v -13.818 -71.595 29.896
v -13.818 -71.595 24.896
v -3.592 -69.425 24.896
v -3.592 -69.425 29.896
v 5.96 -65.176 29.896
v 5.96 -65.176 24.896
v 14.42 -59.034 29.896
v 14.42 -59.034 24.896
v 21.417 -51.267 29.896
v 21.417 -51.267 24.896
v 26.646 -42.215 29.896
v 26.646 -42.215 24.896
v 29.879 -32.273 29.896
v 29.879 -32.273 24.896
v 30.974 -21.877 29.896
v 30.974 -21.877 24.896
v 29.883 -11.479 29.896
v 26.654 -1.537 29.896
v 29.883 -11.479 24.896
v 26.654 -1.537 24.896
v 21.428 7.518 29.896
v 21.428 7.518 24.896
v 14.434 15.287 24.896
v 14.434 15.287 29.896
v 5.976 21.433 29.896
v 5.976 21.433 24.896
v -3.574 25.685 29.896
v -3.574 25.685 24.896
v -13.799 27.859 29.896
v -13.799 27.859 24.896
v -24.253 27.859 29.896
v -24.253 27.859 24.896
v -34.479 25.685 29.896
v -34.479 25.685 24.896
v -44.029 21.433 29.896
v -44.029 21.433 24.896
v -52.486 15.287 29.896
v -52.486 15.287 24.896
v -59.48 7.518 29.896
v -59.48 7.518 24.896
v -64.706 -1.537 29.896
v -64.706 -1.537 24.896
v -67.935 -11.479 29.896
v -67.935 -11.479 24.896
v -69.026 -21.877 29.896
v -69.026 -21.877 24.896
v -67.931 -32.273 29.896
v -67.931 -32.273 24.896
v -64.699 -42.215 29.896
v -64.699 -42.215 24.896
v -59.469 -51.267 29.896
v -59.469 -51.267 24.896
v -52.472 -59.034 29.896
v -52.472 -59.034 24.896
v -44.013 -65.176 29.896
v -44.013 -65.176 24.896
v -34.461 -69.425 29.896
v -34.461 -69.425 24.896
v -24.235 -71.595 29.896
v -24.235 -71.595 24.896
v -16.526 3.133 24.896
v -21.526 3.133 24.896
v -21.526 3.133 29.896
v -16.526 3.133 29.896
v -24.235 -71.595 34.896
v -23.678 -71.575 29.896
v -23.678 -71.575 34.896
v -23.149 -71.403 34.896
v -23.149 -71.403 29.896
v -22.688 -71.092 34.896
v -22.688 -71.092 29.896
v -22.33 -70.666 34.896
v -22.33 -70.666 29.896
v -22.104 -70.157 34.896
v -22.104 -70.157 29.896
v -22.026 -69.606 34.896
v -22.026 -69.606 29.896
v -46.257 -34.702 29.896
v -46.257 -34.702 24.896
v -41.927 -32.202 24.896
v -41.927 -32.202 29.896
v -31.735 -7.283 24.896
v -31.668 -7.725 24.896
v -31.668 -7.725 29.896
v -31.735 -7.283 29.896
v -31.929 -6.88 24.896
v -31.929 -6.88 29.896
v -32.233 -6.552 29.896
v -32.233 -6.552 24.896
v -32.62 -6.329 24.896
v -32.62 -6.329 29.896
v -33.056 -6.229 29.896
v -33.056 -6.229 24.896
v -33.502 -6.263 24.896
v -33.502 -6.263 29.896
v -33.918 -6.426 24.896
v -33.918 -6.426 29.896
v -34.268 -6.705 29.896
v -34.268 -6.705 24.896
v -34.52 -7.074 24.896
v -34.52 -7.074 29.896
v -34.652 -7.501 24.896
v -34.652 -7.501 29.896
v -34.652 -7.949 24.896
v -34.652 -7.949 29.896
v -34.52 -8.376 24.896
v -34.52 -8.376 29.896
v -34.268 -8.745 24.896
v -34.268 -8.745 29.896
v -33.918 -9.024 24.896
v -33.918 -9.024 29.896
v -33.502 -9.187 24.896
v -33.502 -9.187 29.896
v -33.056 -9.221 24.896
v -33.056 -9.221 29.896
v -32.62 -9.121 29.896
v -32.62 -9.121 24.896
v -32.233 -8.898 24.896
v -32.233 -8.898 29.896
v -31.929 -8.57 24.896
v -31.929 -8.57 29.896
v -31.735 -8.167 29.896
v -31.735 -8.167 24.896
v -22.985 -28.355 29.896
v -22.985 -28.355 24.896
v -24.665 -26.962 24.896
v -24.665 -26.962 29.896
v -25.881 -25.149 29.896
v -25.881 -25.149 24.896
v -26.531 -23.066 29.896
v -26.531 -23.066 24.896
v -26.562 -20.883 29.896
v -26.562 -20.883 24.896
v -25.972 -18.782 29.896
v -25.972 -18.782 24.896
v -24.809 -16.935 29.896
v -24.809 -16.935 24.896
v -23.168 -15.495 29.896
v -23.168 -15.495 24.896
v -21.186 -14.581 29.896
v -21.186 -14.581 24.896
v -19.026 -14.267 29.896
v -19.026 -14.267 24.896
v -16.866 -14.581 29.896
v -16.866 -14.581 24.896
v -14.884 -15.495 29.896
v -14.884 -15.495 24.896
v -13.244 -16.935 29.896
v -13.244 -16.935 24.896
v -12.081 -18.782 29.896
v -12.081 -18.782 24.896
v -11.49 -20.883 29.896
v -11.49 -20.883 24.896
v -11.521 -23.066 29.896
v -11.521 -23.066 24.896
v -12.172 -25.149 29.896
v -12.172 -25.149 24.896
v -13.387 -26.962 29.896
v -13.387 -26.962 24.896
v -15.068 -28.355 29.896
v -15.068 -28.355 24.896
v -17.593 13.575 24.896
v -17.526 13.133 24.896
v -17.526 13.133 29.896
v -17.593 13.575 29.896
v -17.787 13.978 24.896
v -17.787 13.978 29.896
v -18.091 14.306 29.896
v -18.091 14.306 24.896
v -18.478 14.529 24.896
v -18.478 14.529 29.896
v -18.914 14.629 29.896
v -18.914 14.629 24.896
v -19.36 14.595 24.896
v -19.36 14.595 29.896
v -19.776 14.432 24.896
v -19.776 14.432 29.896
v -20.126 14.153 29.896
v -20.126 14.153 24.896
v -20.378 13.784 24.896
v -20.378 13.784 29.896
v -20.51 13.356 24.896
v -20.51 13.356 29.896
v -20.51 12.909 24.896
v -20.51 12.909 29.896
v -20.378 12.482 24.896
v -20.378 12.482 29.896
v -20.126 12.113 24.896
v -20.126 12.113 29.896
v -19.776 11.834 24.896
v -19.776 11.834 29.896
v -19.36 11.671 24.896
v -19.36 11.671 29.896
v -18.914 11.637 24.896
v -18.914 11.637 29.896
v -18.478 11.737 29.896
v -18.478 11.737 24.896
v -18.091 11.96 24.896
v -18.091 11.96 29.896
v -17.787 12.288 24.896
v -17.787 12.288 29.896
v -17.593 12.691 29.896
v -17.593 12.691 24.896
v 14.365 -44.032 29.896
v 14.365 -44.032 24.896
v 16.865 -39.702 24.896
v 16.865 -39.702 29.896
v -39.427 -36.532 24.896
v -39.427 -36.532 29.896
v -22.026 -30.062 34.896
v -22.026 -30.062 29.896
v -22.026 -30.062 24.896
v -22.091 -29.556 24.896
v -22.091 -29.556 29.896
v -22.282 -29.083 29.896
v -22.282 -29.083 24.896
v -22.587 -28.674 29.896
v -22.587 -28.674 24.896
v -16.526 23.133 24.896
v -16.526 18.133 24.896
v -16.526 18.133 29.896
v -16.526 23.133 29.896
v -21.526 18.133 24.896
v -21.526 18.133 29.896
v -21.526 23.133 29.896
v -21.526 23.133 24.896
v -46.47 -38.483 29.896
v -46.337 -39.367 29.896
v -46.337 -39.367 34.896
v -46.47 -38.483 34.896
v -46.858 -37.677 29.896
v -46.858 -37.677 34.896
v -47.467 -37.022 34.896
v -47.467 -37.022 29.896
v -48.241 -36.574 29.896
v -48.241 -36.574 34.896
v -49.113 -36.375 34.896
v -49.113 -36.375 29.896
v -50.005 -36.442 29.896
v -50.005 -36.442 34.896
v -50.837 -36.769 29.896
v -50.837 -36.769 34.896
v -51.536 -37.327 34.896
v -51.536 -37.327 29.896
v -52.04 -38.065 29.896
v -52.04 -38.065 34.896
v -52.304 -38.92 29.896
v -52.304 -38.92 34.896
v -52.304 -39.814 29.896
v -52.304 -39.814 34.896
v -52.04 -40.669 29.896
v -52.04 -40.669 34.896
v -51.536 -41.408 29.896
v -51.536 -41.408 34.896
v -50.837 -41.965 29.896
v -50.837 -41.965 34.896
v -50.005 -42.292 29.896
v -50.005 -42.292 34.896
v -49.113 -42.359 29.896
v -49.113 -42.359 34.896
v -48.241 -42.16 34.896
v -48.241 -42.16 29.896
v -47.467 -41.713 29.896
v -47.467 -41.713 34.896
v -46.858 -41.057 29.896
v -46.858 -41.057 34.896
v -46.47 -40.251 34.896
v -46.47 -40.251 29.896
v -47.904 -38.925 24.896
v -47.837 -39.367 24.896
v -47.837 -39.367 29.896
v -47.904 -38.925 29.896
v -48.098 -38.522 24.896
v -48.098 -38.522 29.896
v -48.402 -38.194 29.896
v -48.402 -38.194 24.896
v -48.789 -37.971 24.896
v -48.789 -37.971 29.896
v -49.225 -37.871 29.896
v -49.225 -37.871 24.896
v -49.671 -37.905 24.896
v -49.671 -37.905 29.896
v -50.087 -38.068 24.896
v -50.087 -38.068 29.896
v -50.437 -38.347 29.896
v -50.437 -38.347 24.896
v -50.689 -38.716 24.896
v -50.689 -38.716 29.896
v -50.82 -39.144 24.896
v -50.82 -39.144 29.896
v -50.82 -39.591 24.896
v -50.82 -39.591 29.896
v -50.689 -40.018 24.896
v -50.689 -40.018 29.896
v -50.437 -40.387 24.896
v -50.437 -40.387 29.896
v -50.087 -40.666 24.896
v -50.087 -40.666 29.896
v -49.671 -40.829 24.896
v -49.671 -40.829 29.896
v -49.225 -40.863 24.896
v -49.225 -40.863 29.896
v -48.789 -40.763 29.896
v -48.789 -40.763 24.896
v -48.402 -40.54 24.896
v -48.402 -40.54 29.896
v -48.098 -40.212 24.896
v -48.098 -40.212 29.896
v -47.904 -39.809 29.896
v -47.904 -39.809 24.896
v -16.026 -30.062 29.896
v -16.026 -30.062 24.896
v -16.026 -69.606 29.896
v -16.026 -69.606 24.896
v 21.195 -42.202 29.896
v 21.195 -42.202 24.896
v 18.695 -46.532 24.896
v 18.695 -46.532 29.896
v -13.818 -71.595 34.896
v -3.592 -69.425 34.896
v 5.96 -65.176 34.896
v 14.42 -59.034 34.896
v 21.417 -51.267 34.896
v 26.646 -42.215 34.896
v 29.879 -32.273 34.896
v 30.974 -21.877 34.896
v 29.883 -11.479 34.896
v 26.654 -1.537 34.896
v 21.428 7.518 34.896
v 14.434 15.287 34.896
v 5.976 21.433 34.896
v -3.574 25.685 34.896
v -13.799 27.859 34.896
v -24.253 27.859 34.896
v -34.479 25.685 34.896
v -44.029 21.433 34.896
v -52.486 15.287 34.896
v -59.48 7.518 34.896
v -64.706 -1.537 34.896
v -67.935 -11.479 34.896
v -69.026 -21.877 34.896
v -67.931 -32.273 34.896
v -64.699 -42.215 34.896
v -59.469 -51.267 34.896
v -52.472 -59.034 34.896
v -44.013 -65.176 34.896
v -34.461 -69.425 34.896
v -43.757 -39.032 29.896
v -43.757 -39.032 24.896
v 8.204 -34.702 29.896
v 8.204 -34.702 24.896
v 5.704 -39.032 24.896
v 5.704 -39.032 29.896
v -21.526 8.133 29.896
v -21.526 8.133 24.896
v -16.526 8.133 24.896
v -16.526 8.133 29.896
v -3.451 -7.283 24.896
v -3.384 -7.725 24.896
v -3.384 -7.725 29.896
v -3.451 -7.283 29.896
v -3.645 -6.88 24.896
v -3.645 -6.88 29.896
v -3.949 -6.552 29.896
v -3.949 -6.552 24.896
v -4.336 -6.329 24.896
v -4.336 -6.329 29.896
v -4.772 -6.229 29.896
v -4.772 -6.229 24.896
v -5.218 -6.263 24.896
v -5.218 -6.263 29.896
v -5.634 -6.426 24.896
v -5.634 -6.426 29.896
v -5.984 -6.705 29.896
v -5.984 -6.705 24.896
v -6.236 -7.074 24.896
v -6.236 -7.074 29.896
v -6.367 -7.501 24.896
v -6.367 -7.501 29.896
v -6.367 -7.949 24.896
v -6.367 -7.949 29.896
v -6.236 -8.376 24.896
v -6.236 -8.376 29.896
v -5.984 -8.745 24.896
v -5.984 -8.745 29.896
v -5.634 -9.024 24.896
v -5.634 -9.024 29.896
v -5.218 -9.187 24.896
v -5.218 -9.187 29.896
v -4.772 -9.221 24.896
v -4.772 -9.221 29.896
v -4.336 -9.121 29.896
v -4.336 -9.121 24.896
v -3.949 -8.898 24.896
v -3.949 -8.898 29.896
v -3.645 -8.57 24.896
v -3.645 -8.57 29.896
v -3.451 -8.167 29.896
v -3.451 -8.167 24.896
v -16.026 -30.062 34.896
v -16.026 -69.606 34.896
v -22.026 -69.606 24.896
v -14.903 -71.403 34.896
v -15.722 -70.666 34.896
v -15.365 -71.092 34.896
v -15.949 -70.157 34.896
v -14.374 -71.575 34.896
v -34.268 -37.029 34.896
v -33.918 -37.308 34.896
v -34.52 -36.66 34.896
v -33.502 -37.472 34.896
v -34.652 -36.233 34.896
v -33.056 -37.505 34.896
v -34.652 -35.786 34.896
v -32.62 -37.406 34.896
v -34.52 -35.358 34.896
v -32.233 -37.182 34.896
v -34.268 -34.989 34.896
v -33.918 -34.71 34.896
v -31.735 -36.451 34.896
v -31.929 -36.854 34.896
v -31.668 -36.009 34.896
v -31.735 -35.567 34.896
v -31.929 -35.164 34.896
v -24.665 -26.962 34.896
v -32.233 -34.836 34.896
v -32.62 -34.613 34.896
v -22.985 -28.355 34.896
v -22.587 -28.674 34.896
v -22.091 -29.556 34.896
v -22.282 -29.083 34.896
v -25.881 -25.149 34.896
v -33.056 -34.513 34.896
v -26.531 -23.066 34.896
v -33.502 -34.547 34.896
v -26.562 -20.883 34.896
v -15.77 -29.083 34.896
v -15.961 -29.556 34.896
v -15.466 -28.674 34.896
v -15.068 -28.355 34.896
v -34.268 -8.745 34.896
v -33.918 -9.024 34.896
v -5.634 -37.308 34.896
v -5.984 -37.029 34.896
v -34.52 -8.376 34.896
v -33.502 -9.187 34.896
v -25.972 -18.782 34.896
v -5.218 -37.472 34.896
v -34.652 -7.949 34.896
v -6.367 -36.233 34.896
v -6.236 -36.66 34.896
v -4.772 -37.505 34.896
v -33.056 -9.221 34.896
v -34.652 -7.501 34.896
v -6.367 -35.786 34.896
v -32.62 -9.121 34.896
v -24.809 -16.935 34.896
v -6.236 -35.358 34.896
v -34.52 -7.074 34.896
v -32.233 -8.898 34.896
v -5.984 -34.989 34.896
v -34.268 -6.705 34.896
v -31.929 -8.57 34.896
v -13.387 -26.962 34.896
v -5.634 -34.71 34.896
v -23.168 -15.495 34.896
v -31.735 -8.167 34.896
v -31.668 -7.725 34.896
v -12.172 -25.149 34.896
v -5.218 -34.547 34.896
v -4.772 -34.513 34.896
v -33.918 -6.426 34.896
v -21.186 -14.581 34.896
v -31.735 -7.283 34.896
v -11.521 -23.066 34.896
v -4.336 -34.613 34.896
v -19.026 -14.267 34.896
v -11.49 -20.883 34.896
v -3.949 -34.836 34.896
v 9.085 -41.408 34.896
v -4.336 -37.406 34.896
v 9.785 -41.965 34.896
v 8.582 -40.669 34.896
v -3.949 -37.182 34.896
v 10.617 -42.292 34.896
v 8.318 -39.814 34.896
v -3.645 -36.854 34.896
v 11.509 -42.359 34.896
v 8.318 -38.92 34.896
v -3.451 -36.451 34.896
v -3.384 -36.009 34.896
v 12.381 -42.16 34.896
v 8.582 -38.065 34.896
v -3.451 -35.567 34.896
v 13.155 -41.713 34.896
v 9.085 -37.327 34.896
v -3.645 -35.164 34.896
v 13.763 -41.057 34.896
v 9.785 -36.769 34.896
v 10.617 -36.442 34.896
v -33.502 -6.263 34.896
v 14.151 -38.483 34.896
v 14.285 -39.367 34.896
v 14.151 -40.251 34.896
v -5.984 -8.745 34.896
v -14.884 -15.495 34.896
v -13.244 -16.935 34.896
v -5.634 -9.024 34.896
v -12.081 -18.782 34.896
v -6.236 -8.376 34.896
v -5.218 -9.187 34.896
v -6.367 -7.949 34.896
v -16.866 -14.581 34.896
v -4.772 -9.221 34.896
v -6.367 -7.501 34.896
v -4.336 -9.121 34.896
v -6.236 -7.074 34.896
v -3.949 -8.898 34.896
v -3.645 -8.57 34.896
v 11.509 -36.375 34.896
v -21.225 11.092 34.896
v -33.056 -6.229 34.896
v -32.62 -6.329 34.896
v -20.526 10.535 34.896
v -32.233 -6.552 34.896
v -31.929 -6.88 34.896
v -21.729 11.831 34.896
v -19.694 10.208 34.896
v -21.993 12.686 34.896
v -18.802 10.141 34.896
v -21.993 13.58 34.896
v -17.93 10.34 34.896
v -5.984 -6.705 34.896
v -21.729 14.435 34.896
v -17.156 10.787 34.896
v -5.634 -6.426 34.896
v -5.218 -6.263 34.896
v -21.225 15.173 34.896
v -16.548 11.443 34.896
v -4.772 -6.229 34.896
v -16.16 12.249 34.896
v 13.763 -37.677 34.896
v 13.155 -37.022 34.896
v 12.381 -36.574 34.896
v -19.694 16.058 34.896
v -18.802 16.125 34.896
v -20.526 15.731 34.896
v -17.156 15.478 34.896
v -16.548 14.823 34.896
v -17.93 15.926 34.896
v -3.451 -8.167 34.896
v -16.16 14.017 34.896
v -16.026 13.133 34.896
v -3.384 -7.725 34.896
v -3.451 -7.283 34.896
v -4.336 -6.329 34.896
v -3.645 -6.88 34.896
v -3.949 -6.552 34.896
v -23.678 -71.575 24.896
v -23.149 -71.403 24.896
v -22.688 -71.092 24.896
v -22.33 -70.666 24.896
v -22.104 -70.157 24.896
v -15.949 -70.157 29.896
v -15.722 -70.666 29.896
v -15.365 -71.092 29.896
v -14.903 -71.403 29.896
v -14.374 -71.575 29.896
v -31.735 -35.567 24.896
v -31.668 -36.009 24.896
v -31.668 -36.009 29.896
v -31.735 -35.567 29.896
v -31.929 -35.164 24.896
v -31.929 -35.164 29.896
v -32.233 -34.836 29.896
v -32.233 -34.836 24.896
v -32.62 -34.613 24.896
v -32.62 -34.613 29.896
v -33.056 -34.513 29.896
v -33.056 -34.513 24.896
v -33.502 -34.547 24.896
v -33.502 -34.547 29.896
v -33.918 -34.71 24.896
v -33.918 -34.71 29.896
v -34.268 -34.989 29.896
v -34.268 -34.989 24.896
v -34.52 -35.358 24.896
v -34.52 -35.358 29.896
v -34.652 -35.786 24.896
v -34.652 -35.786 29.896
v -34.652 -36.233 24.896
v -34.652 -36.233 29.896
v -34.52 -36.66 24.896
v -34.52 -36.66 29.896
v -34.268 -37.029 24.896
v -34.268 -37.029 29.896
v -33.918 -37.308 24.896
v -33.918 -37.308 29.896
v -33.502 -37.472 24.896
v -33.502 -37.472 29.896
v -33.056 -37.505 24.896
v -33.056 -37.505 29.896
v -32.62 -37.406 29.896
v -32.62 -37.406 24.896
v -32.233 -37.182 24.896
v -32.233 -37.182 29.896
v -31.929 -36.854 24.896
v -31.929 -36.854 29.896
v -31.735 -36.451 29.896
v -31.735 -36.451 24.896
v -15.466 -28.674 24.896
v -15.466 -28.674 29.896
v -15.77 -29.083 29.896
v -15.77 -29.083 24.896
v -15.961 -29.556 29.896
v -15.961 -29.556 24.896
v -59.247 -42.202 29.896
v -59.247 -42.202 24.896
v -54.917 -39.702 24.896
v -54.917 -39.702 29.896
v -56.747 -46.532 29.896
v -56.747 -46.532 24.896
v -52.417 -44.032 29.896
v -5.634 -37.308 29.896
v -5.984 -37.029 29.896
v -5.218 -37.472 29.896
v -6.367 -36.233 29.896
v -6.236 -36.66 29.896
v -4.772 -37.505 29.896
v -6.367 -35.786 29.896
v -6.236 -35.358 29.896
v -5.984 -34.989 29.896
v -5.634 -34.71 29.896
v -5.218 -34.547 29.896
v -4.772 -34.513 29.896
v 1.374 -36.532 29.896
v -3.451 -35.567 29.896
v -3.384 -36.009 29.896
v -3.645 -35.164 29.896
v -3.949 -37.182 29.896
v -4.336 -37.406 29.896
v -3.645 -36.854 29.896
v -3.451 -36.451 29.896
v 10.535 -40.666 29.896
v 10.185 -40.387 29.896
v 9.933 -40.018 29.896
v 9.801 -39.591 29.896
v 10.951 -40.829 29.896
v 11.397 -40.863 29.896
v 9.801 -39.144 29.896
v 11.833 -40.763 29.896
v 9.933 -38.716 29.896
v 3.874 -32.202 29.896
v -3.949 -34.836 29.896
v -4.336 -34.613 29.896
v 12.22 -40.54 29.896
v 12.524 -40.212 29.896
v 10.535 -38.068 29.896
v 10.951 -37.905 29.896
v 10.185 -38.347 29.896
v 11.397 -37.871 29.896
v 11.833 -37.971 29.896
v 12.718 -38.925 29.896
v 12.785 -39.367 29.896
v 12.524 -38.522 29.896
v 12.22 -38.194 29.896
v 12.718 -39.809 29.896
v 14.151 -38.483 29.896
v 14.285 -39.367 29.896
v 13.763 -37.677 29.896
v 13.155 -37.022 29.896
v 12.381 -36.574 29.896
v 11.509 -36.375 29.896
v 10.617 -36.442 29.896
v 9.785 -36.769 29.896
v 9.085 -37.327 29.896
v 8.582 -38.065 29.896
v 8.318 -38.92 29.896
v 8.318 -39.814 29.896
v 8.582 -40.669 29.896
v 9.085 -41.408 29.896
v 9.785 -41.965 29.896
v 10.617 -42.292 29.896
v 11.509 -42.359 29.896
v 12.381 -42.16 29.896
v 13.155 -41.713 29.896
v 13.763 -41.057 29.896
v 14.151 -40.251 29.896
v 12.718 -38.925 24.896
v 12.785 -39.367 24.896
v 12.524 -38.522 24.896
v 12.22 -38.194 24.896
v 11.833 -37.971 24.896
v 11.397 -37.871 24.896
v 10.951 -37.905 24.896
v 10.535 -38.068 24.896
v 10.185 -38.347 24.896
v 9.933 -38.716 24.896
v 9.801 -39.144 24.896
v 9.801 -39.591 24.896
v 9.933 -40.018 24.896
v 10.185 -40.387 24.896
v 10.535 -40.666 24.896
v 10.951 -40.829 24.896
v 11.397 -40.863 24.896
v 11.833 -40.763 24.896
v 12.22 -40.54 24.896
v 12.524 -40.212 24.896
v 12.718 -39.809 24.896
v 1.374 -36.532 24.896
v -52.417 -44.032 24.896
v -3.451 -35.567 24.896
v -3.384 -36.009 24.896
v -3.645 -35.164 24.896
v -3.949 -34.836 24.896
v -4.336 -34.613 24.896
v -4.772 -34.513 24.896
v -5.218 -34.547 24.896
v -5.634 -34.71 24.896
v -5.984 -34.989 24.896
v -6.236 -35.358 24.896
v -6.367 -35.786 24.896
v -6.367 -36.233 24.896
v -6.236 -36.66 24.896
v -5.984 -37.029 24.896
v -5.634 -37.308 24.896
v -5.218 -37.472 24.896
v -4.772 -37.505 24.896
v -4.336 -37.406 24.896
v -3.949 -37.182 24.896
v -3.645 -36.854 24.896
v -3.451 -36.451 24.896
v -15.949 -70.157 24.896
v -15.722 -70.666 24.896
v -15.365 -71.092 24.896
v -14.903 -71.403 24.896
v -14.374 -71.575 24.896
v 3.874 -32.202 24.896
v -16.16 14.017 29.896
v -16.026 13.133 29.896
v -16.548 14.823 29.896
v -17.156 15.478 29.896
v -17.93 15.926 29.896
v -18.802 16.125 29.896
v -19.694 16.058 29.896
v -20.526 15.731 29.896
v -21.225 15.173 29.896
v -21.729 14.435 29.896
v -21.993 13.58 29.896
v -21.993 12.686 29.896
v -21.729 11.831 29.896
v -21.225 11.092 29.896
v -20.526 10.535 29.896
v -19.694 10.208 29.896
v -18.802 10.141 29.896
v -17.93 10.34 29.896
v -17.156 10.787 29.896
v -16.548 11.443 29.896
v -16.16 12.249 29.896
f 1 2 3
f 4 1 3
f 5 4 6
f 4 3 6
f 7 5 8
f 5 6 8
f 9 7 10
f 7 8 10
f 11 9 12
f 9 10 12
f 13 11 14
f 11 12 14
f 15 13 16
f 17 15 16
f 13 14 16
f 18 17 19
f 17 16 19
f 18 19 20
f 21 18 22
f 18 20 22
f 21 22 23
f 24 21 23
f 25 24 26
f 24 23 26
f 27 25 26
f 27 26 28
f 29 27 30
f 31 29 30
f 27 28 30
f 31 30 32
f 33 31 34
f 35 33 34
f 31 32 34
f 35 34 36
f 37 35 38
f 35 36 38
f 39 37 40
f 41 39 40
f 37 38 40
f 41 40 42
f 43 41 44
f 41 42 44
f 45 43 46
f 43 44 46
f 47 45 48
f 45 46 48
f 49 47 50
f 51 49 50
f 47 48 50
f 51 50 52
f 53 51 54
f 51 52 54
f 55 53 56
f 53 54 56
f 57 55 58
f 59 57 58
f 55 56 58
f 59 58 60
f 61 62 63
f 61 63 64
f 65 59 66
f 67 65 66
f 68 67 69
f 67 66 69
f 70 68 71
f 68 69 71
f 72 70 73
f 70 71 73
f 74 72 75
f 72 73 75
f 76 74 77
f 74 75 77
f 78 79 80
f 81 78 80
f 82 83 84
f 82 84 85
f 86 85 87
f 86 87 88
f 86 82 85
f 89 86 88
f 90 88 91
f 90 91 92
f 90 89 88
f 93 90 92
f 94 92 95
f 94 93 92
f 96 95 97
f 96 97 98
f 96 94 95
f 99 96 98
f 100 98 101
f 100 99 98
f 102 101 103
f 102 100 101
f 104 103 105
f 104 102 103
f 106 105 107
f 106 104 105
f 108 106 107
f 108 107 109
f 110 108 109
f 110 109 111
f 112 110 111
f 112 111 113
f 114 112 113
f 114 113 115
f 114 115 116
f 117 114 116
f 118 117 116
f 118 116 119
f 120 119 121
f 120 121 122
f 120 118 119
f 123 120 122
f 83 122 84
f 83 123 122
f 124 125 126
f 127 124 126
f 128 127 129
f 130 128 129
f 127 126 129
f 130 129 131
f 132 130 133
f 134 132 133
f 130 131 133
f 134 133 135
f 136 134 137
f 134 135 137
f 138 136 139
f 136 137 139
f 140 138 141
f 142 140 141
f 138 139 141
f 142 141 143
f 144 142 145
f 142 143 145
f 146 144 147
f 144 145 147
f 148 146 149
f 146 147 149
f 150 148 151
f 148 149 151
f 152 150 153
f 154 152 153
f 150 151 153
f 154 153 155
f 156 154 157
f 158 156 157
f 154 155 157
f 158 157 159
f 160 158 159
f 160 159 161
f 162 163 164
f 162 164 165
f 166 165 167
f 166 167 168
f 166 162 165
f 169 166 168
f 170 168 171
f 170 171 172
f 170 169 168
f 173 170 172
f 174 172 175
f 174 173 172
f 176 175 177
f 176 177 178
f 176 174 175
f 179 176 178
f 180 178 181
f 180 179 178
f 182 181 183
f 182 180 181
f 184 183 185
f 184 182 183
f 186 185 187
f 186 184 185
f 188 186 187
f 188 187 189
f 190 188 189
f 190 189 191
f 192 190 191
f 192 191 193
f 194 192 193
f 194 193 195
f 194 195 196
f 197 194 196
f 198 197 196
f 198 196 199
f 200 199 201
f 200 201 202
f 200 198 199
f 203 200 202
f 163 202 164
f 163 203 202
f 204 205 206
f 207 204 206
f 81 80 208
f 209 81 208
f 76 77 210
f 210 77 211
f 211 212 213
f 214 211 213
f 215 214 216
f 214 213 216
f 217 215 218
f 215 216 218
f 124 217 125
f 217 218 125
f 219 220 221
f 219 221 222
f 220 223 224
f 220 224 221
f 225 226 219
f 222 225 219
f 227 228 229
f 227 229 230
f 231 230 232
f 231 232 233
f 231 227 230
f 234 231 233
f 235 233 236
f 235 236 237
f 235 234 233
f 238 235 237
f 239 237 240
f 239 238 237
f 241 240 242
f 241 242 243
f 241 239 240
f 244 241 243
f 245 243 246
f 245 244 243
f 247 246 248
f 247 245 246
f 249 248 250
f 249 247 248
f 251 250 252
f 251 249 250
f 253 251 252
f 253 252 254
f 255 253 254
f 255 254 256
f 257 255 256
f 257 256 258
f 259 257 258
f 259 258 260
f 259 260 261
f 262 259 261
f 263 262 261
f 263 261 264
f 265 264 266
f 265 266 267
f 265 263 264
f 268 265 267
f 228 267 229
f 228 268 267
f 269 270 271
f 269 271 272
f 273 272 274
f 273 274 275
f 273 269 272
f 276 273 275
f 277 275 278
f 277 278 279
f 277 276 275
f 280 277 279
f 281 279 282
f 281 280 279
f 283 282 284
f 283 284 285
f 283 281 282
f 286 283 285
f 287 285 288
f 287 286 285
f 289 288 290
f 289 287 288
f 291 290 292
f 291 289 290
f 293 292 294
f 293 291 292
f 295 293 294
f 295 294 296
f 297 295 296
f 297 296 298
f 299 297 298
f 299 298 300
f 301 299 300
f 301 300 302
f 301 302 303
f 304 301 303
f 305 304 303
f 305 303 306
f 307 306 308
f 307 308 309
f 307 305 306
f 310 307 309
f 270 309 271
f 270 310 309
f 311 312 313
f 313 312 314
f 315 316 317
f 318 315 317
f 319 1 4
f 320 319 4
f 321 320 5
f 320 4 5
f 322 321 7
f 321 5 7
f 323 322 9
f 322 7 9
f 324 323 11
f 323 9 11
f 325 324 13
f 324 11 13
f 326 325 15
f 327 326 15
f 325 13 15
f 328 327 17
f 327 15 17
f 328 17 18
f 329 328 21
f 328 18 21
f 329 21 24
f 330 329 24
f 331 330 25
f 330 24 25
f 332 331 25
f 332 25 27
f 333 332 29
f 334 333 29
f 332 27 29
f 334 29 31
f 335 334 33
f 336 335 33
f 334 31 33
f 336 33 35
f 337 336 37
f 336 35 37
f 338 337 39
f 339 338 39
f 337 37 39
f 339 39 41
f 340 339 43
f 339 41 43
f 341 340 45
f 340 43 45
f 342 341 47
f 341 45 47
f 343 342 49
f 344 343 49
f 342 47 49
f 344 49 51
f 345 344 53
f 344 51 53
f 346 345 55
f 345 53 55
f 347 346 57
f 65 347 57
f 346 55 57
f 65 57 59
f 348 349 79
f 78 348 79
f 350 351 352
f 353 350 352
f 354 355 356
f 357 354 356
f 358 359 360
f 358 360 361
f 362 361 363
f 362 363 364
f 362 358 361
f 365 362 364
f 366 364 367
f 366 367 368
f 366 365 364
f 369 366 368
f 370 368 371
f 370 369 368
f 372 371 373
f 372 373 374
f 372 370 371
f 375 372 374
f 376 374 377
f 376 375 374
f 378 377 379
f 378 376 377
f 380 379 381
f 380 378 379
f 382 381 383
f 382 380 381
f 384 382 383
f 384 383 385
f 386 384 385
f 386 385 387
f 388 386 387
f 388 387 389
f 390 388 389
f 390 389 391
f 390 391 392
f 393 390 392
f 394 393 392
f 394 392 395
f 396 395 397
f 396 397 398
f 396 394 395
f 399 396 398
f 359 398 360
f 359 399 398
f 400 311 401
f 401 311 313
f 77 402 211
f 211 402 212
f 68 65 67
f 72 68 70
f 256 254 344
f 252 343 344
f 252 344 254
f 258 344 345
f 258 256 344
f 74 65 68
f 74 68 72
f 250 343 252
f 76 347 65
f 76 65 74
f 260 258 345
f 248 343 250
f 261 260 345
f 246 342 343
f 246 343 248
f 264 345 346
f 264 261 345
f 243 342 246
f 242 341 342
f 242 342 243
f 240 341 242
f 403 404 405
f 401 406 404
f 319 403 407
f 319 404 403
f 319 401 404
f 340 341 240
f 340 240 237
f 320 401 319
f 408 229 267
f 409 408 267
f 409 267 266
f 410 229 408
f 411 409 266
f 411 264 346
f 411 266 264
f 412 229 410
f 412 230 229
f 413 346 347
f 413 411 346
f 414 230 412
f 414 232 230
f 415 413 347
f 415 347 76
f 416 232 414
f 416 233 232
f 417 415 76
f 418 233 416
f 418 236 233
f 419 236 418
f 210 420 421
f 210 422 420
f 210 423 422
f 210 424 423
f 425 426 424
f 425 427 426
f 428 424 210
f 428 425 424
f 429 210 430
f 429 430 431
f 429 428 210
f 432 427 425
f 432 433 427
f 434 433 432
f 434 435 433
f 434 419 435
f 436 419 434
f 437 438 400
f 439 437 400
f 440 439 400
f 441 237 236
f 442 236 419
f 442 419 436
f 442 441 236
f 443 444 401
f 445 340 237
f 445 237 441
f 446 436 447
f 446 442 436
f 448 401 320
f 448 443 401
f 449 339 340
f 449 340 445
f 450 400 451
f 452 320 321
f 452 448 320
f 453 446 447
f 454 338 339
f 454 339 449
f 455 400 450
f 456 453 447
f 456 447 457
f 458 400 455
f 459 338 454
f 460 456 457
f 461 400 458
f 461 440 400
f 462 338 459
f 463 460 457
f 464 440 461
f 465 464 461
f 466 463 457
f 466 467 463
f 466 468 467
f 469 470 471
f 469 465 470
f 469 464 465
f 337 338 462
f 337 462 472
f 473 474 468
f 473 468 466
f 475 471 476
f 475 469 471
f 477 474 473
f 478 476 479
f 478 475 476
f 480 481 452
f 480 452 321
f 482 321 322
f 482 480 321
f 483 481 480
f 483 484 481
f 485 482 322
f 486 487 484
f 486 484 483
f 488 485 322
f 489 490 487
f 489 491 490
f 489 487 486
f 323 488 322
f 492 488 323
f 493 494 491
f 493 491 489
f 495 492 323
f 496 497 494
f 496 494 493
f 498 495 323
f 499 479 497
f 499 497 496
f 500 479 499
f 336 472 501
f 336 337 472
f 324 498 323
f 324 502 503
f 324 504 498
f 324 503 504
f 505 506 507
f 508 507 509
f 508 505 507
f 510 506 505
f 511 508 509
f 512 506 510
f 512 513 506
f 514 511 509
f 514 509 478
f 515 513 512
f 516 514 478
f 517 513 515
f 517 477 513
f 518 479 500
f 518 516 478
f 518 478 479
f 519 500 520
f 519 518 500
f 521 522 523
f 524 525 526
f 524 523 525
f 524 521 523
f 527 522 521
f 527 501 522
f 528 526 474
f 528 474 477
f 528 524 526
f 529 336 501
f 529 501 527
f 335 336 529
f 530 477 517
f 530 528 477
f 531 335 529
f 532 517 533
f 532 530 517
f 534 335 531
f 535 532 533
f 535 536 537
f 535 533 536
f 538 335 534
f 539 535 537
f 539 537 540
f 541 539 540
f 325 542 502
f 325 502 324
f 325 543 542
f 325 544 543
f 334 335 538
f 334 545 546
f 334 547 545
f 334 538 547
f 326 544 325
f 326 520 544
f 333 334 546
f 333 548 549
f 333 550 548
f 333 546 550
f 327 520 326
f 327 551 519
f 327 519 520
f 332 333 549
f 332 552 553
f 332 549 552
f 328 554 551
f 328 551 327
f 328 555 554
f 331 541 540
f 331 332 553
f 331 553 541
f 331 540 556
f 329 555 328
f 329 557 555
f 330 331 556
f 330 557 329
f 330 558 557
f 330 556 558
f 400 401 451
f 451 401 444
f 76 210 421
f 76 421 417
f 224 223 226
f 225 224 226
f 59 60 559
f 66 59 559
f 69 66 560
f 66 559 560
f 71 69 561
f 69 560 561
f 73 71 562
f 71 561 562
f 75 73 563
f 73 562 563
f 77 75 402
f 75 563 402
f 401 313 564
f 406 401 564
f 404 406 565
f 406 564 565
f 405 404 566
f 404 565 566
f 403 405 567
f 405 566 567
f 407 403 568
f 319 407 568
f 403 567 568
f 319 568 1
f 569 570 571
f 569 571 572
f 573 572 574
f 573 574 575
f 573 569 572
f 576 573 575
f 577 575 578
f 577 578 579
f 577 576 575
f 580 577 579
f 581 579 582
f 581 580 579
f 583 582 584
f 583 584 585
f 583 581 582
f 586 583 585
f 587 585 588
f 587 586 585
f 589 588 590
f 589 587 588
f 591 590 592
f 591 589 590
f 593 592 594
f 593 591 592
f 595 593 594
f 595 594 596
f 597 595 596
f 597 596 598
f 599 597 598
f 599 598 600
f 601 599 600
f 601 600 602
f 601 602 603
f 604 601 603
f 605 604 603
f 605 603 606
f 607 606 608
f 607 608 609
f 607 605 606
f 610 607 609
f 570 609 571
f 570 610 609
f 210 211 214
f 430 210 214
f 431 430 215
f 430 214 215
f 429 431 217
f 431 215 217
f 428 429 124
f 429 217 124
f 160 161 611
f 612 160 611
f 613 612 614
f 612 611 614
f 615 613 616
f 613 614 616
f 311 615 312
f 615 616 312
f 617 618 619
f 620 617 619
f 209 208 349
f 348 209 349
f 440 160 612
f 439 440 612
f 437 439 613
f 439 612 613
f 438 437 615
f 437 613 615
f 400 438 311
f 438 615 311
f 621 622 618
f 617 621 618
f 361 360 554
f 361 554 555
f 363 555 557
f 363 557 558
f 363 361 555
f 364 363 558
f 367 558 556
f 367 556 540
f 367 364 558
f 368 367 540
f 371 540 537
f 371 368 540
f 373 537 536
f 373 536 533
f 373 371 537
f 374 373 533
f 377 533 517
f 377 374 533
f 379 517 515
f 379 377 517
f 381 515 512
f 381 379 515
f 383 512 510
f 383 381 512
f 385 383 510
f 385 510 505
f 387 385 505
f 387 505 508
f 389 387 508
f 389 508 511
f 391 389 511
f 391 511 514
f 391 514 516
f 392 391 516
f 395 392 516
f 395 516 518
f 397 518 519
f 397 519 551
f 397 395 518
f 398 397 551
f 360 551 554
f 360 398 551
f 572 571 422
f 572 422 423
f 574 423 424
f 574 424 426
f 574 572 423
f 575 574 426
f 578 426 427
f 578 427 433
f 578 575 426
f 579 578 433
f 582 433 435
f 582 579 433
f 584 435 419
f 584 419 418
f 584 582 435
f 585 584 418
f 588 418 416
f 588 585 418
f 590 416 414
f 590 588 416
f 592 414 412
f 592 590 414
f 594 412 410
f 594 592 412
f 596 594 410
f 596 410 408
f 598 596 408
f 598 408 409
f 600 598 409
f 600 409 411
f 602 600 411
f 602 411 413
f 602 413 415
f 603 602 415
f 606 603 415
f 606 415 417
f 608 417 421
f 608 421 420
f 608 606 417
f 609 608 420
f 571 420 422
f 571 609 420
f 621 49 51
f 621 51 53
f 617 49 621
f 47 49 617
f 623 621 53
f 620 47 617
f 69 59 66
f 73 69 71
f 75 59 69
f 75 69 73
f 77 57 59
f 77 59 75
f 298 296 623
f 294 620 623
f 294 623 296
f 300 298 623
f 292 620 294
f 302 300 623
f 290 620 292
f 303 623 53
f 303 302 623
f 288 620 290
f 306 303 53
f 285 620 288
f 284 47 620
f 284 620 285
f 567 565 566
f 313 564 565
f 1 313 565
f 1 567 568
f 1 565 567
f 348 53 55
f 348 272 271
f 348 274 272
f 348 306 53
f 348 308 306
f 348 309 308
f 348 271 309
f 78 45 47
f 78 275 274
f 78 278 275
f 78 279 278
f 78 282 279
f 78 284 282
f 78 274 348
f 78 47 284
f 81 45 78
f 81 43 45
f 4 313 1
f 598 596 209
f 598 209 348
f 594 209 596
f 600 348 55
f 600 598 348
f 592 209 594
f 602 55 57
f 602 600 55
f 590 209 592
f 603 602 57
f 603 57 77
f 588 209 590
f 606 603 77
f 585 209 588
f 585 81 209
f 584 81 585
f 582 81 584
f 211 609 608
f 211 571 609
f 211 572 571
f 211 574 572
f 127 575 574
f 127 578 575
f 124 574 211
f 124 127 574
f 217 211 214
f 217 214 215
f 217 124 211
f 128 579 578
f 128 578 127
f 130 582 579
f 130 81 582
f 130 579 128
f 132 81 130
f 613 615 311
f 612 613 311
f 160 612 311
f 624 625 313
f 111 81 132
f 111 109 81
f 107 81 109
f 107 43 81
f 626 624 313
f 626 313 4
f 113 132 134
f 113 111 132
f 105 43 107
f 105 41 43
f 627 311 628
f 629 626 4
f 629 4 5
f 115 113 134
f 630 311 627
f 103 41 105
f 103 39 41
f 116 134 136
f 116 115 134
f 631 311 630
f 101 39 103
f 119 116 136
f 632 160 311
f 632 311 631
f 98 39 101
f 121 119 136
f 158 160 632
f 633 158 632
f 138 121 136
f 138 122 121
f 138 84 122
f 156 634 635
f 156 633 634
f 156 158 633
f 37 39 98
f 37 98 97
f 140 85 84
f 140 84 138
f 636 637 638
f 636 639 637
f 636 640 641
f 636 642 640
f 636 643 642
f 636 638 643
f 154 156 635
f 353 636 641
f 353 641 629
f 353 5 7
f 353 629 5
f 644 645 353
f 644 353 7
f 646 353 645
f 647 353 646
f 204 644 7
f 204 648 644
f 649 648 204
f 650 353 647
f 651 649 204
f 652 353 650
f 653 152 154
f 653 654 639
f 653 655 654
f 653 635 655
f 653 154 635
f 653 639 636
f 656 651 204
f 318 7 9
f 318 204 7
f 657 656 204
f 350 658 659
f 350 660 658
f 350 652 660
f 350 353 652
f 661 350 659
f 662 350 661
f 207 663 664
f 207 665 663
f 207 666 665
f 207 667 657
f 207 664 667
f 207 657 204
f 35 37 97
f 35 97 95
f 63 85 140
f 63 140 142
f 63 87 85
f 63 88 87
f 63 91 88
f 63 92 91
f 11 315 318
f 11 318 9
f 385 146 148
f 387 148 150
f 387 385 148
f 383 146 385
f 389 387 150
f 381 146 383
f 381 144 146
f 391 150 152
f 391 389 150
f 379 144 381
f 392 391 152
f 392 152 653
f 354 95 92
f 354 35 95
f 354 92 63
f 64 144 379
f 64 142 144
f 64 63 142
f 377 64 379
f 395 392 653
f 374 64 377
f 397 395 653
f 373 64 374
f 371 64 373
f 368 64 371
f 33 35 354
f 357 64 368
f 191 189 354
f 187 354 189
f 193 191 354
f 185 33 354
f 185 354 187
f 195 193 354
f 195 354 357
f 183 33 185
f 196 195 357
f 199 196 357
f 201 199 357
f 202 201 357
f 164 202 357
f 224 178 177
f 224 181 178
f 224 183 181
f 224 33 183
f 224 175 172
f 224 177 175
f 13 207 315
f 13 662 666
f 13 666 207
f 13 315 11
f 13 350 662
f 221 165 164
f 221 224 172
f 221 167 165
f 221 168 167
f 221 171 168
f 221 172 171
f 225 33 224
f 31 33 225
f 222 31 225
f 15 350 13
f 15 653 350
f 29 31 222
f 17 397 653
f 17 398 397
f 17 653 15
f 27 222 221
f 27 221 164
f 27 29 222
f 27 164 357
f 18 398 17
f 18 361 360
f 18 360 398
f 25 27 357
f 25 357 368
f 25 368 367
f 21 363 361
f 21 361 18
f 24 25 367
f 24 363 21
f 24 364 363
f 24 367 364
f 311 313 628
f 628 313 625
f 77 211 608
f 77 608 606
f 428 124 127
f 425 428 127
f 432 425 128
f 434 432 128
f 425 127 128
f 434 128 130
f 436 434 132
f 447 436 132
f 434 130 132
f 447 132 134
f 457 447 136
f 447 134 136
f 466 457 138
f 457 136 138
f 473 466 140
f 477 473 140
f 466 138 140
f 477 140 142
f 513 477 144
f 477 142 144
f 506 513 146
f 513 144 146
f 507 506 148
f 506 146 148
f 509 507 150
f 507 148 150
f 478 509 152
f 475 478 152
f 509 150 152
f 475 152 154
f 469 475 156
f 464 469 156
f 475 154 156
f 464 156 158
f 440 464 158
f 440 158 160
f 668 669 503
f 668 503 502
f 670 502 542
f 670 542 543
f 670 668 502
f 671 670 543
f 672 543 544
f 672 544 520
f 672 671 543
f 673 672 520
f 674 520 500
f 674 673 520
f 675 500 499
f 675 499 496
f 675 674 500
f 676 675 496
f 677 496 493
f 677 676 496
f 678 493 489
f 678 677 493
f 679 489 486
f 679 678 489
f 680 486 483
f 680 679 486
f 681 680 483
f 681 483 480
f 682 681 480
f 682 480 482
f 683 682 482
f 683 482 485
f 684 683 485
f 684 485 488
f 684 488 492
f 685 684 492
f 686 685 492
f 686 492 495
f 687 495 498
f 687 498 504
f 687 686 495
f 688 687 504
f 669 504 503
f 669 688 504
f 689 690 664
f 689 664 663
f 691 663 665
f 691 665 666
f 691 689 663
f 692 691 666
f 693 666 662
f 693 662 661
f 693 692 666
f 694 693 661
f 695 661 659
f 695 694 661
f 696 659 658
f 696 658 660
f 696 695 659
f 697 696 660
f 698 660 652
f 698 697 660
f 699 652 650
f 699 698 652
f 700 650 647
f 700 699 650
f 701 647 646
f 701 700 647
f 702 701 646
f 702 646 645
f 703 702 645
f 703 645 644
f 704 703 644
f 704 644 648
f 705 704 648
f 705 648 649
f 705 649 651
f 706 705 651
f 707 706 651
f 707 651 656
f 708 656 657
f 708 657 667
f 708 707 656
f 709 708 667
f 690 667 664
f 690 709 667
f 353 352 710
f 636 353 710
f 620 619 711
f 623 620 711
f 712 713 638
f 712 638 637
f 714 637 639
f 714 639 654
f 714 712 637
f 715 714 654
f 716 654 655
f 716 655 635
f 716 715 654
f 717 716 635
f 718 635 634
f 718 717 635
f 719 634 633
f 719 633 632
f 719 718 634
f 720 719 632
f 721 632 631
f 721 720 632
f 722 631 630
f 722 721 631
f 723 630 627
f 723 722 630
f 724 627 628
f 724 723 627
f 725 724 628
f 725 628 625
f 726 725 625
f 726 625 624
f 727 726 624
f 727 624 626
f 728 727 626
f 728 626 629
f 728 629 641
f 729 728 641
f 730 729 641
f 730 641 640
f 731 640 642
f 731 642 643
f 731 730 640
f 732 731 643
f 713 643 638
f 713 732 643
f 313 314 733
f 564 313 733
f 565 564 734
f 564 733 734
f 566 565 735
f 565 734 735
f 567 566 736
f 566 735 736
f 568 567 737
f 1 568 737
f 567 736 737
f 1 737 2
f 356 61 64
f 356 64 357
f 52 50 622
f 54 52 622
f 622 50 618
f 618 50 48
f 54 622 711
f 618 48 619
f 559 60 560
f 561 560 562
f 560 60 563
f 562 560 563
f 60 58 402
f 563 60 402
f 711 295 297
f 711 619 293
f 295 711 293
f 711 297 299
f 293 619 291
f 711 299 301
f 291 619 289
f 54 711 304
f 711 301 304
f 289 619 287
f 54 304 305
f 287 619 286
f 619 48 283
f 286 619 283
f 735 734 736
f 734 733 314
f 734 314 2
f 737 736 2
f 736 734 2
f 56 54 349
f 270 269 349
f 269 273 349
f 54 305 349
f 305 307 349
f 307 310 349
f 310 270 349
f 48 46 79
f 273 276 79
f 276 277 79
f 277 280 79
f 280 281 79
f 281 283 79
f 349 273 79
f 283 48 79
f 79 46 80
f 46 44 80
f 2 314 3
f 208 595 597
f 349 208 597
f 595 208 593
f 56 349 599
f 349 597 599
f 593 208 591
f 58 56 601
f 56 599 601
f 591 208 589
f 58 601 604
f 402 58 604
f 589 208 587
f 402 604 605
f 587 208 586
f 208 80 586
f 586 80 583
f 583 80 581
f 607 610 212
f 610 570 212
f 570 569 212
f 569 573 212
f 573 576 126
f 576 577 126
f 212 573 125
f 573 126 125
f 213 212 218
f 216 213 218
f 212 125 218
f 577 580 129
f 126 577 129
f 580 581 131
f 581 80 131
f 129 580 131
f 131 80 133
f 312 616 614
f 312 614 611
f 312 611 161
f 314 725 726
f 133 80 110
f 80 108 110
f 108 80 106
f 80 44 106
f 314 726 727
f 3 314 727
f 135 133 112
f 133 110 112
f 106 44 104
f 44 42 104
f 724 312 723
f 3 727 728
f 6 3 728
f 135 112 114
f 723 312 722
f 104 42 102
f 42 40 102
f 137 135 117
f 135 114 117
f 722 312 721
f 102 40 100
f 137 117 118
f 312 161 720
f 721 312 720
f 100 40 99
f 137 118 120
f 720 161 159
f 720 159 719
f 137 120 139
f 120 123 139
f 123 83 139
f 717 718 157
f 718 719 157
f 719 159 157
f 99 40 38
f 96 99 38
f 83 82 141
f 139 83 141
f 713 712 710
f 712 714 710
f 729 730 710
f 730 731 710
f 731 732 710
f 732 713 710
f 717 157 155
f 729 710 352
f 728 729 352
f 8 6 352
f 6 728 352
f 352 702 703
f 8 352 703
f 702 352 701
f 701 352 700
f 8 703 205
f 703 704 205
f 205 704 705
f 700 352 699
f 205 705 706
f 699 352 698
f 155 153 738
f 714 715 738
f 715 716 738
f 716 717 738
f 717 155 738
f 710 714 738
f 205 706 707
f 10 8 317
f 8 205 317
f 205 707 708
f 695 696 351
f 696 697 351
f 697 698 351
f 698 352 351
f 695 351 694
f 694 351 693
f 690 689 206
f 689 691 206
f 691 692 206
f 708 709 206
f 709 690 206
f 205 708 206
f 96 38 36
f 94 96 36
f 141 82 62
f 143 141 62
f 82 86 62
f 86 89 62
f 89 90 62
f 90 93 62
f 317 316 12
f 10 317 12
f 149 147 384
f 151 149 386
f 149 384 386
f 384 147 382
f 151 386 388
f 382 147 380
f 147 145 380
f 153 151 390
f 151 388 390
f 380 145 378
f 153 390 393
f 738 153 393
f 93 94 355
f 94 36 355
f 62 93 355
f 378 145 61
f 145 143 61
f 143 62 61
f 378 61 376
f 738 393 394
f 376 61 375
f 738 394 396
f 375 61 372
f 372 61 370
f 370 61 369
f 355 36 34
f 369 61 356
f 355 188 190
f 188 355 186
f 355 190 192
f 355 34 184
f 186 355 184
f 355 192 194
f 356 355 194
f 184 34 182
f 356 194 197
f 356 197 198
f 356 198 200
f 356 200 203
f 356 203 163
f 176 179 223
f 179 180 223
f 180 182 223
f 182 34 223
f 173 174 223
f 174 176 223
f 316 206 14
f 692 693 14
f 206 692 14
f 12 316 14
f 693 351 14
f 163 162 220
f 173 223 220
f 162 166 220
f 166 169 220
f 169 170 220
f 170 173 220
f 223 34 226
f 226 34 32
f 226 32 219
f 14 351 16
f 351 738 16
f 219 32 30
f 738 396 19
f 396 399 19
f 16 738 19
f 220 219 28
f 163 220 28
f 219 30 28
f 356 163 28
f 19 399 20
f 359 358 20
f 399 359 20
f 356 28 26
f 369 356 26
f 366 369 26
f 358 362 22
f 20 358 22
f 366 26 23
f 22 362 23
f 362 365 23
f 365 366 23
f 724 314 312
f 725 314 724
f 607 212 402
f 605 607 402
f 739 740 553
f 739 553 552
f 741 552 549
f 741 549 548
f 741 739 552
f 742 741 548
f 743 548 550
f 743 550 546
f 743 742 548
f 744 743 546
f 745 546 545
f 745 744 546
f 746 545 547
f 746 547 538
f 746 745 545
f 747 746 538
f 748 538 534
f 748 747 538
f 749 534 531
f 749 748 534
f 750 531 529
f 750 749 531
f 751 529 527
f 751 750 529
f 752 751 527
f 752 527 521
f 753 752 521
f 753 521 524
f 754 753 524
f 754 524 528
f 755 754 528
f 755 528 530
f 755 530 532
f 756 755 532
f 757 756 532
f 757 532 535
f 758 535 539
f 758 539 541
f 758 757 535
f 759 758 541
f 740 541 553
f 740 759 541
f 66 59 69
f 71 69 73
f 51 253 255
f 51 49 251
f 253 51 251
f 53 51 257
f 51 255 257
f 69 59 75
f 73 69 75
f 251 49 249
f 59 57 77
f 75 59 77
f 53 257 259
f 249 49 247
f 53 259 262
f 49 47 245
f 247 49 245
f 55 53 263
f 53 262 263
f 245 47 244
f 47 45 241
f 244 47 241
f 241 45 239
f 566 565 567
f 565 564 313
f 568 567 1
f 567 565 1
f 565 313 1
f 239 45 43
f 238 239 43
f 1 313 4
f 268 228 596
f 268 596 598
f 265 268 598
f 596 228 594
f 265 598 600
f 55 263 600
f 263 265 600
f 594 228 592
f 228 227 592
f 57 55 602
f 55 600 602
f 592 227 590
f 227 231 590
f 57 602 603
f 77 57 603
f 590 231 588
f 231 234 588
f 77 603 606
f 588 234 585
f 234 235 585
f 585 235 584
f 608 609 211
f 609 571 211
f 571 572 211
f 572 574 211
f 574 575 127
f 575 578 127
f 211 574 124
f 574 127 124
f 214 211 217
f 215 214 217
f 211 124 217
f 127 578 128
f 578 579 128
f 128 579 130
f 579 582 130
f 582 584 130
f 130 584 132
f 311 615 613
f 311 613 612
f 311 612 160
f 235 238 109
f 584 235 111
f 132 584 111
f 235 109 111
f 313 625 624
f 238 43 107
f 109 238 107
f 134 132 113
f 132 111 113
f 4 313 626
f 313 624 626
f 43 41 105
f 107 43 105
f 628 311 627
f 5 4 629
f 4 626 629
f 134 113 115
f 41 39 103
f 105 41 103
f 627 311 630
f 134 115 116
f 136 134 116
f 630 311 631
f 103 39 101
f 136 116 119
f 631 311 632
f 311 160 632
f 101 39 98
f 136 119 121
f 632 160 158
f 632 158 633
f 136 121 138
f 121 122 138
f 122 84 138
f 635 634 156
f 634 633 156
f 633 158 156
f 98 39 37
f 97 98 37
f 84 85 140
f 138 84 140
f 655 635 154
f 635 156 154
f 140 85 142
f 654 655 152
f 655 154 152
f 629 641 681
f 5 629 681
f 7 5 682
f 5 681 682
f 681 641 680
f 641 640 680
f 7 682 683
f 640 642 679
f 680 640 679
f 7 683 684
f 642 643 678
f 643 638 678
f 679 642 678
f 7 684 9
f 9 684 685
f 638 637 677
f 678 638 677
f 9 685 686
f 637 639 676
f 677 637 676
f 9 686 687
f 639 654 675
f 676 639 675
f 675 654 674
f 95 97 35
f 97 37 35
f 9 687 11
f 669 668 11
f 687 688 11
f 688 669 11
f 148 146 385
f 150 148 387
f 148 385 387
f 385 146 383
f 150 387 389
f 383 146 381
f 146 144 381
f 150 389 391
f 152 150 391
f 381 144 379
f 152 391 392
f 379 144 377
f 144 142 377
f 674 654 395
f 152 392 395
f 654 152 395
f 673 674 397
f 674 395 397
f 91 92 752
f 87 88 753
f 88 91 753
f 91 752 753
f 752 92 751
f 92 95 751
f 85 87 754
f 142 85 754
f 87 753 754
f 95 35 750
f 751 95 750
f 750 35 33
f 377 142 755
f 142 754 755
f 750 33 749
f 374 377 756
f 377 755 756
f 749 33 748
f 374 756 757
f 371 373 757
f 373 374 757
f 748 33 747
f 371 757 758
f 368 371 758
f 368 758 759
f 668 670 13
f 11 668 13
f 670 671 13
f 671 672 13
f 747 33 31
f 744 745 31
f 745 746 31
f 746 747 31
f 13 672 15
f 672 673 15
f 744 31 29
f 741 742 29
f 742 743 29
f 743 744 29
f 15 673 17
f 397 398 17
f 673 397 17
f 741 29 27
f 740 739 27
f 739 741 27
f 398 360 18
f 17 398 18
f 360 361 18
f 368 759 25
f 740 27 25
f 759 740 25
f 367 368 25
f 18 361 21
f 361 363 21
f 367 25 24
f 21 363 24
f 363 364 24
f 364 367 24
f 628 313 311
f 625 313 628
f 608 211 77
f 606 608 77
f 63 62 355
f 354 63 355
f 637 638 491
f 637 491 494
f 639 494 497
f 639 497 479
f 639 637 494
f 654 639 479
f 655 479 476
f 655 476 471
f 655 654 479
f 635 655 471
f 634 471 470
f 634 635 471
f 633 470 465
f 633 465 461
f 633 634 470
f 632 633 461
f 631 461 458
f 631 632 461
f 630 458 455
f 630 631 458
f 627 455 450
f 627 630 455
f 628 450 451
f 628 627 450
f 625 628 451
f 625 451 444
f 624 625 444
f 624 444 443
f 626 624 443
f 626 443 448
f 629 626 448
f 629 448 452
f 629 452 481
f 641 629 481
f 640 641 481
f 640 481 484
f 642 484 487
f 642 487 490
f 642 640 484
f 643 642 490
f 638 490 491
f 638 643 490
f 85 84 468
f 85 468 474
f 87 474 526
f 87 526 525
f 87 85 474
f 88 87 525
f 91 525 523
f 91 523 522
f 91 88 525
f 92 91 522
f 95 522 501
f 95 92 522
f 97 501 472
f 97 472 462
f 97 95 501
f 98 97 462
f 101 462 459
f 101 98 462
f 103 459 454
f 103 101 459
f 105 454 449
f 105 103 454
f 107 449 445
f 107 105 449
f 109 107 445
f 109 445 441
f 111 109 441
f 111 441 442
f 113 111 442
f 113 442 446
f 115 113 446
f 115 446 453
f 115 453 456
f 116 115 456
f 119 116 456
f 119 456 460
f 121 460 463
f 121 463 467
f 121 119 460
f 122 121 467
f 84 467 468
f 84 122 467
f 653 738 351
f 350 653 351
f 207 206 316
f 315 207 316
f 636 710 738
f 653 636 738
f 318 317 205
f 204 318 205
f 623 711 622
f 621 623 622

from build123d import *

# Parameters (mm, degrees)
BODY_MOVE_COPY2_START     = 24.896087842
BODY_MOVE_COPY2_OUTLINE_R = 1.5
BODY_MOVE_COPY2_OUTLINE_W = 5
BODY_MOVE_COPY2_OUTLINE_H = 5
BODY_MOVE_COPY2_DEPTH     = 5
SKETCH2_R                 = 3
SKETCH2_R_2               = 1.5
BOSS_EXTRUDE1_DEPTH       = 5


# Read off the part's stored shape, not the designer's step: Body-Move/Copy2
with BuildPart() as part:
    # Body-Move/Copy2 outline → Body-Move/Copy2 (new body)
    with BuildSketch(Plane.XY.offset(BODY_MOVE_COPY2_START)):
        with BuildLine():
            ThreePointArc((-22.026273853, -30.062216719), (-22.282236391, -29.083271708), (-22.984607186, -28.354899948))
            ThreePointArc((-22.984607186, -28.354899948), (-19.026273852, -14.267096219), (-15.067940519, -28.354899948))
            ThreePointArc((-15.067940519, -28.354899948), (-15.770311314, -29.083271708), (-16.026273853, -30.062216719))
            Line((-16.026273853, -30.062216719), (-16.026273853, -69.605969269))
            ThreePointArc((-16.026273853, -69.605969269), (-15.364805386, -71.092015477), (-13.817940519, -71.595088979))
            ThreePointArc((-13.817940519, -71.595088979), (-19.026273853, 28.132903781), (-24.234607186, -71.595088979))
            ThreePointArc((-24.234607186, -71.595088979), (-22.687742319, -71.092015477), (-22.026273853, -69.605969269))
            Line((-22.026273853, -69.605969269), (-22.026273853, -30.062216719))
        make_face()
        Polygon((-59.247417023, -42.20203271), (-54.917290004, -39.70203271), (-52.417290004, -44.032159729), (-56.747417023, -46.532159729), align=None, mode=Mode.SUBTRACT)
        with Locations((-49.337162985, -39.367096219)):
            Circle(BODY_MOVE_COPY2_OUTLINE_R, mode=Mode.SUBTRACT)
        Polygon((-39.426908947, -36.532159729), (-43.757035966, -39.032159729), (-46.257035966, -34.70203271), (-41.926908947, -32.20203271), align=None, mode=Mode.SUBTRACT)
        with Locations((-33.168409476, -36.009231843)):
            Circle(BODY_MOVE_COPY2_OUTLINE_R, mode=Mode.SUBTRACT)
        with Locations((-4.884138229, -36.009231843)):
            Circle(BODY_MOVE_COPY2_OUTLINE_R, mode=Mode.SUBTRACT)
        Polygon((3.874361242, -32.20203271), (8.204488261, -34.70203271), (5.704488261, -39.032159729), (1.374361242, -36.532159729), align=None, mode=Mode.SUBTRACT)
        Polygon((18.694869318, -46.532159729), (14.364742299, -44.032159729), (16.864742299, -39.70203271), (21.194869318, -42.20203271), align=None, mode=Mode.SUBTRACT)
        with Locations((11.28461528, -39.367096219)):
            Circle(BODY_MOVE_COPY2_OUTLINE_R, mode=Mode.SUBTRACT)
        with Locations((-33.168409476, -7.724960596)):
            Circle(BODY_MOVE_COPY2_OUTLINE_R, mode=Mode.SUBTRACT)
        with Locations((-19.026273853, 5.632903781)):
            Rectangle(BODY_MOVE_COPY2_OUTLINE_W, BODY_MOVE_COPY2_OUTLINE_H, mode=Mode.SUBTRACT)
        with Locations((-19.026273853, 13.132903781)):
            Circle(BODY_MOVE_COPY2_OUTLINE_R, mode=Mode.SUBTRACT)
        with Locations((-19.026273853, 20.632903781)):
            Rectangle(BODY_MOVE_COPY2_OUTLINE_W, BODY_MOVE_COPY2_OUTLINE_H, mode=Mode.SUBTRACT)
        with Locations((-4.884138229, -7.724960596)):
            Circle(BODY_MOVE_COPY2_OUTLINE_R, mode=Mode.SUBTRACT)
    extrude(amount=BODY_MOVE_COPY2_DEPTH)


with BuildPart() as body_2:
    # Sketch2 → Boss-Extrude1 (new body)
    with BuildSketch(Plane.XY.offset(29.896087842)):
        with BuildLine():
            Line((-16.026273853, -30.062216719), (-16.026273853, -69.605969269))
            ThreePointArc((-16.026273853, -69.605969269), (-15.364805386, -71.092015477), (-13.817940519, -71.595088979))
            ThreePointArc((-13.817940519, -71.595088979), (-19.026273853, 28.132903781), (-24.234607186, -71.595088979))
            ThreePointArc((-24.234607186, -71.595088979), (-22.687742319, -71.092015477), (-22.026273853, -69.605969269))
            Line((-22.026273853, -69.605969269), (-22.026273853, -30.062216719))
            ThreePointArc((-22.026273853, -30.062216719), (-22.282236391, -29.083271708), (-22.984607186, -28.354899948))
            ThreePointArc((-22.984607186, -28.354899948), (-19.026273853, -14.267096219), (-15.067940519, -28.354899948))
            ThreePointArc((-15.067940519, -28.354899948), (-15.770311314, -29.083271708), (-16.026273853, -30.062216719))
        make_face()
        with Locations((-19.026273853, 13.132903781)):
            Circle(SKETCH2_R, mode=Mode.SUBTRACT)
        with Locations((11.28461528, -39.367096219)):
            Circle(SKETCH2_R, mode=Mode.SUBTRACT)
        with Locations((-49.337162985, -39.367096219)):
            Circle(SKETCH2_R, mode=Mode.SUBTRACT)
        with Locations((-33.168409476, -7.724960596)):
            Circle(SKETCH2_R_2, mode=Mode.SUBTRACT)
        with Locations((-4.884138229, -7.724960596)):
            Circle(SKETCH2_R_2, mode=Mode.SUBTRACT)
        with Locations((-4.884138229, -36.009231843)):
            Circle(SKETCH2_R_2, mode=Mode.SUBTRACT)
        with Locations((-33.168409476, -36.009231843)):
            Circle(SKETCH2_R_2, mode=Mode.SUBTRACT)
    extrude(amount=BOSS_EXTRUDE1_DEPTH)


solid = Compound([part.part, body_2.part])
